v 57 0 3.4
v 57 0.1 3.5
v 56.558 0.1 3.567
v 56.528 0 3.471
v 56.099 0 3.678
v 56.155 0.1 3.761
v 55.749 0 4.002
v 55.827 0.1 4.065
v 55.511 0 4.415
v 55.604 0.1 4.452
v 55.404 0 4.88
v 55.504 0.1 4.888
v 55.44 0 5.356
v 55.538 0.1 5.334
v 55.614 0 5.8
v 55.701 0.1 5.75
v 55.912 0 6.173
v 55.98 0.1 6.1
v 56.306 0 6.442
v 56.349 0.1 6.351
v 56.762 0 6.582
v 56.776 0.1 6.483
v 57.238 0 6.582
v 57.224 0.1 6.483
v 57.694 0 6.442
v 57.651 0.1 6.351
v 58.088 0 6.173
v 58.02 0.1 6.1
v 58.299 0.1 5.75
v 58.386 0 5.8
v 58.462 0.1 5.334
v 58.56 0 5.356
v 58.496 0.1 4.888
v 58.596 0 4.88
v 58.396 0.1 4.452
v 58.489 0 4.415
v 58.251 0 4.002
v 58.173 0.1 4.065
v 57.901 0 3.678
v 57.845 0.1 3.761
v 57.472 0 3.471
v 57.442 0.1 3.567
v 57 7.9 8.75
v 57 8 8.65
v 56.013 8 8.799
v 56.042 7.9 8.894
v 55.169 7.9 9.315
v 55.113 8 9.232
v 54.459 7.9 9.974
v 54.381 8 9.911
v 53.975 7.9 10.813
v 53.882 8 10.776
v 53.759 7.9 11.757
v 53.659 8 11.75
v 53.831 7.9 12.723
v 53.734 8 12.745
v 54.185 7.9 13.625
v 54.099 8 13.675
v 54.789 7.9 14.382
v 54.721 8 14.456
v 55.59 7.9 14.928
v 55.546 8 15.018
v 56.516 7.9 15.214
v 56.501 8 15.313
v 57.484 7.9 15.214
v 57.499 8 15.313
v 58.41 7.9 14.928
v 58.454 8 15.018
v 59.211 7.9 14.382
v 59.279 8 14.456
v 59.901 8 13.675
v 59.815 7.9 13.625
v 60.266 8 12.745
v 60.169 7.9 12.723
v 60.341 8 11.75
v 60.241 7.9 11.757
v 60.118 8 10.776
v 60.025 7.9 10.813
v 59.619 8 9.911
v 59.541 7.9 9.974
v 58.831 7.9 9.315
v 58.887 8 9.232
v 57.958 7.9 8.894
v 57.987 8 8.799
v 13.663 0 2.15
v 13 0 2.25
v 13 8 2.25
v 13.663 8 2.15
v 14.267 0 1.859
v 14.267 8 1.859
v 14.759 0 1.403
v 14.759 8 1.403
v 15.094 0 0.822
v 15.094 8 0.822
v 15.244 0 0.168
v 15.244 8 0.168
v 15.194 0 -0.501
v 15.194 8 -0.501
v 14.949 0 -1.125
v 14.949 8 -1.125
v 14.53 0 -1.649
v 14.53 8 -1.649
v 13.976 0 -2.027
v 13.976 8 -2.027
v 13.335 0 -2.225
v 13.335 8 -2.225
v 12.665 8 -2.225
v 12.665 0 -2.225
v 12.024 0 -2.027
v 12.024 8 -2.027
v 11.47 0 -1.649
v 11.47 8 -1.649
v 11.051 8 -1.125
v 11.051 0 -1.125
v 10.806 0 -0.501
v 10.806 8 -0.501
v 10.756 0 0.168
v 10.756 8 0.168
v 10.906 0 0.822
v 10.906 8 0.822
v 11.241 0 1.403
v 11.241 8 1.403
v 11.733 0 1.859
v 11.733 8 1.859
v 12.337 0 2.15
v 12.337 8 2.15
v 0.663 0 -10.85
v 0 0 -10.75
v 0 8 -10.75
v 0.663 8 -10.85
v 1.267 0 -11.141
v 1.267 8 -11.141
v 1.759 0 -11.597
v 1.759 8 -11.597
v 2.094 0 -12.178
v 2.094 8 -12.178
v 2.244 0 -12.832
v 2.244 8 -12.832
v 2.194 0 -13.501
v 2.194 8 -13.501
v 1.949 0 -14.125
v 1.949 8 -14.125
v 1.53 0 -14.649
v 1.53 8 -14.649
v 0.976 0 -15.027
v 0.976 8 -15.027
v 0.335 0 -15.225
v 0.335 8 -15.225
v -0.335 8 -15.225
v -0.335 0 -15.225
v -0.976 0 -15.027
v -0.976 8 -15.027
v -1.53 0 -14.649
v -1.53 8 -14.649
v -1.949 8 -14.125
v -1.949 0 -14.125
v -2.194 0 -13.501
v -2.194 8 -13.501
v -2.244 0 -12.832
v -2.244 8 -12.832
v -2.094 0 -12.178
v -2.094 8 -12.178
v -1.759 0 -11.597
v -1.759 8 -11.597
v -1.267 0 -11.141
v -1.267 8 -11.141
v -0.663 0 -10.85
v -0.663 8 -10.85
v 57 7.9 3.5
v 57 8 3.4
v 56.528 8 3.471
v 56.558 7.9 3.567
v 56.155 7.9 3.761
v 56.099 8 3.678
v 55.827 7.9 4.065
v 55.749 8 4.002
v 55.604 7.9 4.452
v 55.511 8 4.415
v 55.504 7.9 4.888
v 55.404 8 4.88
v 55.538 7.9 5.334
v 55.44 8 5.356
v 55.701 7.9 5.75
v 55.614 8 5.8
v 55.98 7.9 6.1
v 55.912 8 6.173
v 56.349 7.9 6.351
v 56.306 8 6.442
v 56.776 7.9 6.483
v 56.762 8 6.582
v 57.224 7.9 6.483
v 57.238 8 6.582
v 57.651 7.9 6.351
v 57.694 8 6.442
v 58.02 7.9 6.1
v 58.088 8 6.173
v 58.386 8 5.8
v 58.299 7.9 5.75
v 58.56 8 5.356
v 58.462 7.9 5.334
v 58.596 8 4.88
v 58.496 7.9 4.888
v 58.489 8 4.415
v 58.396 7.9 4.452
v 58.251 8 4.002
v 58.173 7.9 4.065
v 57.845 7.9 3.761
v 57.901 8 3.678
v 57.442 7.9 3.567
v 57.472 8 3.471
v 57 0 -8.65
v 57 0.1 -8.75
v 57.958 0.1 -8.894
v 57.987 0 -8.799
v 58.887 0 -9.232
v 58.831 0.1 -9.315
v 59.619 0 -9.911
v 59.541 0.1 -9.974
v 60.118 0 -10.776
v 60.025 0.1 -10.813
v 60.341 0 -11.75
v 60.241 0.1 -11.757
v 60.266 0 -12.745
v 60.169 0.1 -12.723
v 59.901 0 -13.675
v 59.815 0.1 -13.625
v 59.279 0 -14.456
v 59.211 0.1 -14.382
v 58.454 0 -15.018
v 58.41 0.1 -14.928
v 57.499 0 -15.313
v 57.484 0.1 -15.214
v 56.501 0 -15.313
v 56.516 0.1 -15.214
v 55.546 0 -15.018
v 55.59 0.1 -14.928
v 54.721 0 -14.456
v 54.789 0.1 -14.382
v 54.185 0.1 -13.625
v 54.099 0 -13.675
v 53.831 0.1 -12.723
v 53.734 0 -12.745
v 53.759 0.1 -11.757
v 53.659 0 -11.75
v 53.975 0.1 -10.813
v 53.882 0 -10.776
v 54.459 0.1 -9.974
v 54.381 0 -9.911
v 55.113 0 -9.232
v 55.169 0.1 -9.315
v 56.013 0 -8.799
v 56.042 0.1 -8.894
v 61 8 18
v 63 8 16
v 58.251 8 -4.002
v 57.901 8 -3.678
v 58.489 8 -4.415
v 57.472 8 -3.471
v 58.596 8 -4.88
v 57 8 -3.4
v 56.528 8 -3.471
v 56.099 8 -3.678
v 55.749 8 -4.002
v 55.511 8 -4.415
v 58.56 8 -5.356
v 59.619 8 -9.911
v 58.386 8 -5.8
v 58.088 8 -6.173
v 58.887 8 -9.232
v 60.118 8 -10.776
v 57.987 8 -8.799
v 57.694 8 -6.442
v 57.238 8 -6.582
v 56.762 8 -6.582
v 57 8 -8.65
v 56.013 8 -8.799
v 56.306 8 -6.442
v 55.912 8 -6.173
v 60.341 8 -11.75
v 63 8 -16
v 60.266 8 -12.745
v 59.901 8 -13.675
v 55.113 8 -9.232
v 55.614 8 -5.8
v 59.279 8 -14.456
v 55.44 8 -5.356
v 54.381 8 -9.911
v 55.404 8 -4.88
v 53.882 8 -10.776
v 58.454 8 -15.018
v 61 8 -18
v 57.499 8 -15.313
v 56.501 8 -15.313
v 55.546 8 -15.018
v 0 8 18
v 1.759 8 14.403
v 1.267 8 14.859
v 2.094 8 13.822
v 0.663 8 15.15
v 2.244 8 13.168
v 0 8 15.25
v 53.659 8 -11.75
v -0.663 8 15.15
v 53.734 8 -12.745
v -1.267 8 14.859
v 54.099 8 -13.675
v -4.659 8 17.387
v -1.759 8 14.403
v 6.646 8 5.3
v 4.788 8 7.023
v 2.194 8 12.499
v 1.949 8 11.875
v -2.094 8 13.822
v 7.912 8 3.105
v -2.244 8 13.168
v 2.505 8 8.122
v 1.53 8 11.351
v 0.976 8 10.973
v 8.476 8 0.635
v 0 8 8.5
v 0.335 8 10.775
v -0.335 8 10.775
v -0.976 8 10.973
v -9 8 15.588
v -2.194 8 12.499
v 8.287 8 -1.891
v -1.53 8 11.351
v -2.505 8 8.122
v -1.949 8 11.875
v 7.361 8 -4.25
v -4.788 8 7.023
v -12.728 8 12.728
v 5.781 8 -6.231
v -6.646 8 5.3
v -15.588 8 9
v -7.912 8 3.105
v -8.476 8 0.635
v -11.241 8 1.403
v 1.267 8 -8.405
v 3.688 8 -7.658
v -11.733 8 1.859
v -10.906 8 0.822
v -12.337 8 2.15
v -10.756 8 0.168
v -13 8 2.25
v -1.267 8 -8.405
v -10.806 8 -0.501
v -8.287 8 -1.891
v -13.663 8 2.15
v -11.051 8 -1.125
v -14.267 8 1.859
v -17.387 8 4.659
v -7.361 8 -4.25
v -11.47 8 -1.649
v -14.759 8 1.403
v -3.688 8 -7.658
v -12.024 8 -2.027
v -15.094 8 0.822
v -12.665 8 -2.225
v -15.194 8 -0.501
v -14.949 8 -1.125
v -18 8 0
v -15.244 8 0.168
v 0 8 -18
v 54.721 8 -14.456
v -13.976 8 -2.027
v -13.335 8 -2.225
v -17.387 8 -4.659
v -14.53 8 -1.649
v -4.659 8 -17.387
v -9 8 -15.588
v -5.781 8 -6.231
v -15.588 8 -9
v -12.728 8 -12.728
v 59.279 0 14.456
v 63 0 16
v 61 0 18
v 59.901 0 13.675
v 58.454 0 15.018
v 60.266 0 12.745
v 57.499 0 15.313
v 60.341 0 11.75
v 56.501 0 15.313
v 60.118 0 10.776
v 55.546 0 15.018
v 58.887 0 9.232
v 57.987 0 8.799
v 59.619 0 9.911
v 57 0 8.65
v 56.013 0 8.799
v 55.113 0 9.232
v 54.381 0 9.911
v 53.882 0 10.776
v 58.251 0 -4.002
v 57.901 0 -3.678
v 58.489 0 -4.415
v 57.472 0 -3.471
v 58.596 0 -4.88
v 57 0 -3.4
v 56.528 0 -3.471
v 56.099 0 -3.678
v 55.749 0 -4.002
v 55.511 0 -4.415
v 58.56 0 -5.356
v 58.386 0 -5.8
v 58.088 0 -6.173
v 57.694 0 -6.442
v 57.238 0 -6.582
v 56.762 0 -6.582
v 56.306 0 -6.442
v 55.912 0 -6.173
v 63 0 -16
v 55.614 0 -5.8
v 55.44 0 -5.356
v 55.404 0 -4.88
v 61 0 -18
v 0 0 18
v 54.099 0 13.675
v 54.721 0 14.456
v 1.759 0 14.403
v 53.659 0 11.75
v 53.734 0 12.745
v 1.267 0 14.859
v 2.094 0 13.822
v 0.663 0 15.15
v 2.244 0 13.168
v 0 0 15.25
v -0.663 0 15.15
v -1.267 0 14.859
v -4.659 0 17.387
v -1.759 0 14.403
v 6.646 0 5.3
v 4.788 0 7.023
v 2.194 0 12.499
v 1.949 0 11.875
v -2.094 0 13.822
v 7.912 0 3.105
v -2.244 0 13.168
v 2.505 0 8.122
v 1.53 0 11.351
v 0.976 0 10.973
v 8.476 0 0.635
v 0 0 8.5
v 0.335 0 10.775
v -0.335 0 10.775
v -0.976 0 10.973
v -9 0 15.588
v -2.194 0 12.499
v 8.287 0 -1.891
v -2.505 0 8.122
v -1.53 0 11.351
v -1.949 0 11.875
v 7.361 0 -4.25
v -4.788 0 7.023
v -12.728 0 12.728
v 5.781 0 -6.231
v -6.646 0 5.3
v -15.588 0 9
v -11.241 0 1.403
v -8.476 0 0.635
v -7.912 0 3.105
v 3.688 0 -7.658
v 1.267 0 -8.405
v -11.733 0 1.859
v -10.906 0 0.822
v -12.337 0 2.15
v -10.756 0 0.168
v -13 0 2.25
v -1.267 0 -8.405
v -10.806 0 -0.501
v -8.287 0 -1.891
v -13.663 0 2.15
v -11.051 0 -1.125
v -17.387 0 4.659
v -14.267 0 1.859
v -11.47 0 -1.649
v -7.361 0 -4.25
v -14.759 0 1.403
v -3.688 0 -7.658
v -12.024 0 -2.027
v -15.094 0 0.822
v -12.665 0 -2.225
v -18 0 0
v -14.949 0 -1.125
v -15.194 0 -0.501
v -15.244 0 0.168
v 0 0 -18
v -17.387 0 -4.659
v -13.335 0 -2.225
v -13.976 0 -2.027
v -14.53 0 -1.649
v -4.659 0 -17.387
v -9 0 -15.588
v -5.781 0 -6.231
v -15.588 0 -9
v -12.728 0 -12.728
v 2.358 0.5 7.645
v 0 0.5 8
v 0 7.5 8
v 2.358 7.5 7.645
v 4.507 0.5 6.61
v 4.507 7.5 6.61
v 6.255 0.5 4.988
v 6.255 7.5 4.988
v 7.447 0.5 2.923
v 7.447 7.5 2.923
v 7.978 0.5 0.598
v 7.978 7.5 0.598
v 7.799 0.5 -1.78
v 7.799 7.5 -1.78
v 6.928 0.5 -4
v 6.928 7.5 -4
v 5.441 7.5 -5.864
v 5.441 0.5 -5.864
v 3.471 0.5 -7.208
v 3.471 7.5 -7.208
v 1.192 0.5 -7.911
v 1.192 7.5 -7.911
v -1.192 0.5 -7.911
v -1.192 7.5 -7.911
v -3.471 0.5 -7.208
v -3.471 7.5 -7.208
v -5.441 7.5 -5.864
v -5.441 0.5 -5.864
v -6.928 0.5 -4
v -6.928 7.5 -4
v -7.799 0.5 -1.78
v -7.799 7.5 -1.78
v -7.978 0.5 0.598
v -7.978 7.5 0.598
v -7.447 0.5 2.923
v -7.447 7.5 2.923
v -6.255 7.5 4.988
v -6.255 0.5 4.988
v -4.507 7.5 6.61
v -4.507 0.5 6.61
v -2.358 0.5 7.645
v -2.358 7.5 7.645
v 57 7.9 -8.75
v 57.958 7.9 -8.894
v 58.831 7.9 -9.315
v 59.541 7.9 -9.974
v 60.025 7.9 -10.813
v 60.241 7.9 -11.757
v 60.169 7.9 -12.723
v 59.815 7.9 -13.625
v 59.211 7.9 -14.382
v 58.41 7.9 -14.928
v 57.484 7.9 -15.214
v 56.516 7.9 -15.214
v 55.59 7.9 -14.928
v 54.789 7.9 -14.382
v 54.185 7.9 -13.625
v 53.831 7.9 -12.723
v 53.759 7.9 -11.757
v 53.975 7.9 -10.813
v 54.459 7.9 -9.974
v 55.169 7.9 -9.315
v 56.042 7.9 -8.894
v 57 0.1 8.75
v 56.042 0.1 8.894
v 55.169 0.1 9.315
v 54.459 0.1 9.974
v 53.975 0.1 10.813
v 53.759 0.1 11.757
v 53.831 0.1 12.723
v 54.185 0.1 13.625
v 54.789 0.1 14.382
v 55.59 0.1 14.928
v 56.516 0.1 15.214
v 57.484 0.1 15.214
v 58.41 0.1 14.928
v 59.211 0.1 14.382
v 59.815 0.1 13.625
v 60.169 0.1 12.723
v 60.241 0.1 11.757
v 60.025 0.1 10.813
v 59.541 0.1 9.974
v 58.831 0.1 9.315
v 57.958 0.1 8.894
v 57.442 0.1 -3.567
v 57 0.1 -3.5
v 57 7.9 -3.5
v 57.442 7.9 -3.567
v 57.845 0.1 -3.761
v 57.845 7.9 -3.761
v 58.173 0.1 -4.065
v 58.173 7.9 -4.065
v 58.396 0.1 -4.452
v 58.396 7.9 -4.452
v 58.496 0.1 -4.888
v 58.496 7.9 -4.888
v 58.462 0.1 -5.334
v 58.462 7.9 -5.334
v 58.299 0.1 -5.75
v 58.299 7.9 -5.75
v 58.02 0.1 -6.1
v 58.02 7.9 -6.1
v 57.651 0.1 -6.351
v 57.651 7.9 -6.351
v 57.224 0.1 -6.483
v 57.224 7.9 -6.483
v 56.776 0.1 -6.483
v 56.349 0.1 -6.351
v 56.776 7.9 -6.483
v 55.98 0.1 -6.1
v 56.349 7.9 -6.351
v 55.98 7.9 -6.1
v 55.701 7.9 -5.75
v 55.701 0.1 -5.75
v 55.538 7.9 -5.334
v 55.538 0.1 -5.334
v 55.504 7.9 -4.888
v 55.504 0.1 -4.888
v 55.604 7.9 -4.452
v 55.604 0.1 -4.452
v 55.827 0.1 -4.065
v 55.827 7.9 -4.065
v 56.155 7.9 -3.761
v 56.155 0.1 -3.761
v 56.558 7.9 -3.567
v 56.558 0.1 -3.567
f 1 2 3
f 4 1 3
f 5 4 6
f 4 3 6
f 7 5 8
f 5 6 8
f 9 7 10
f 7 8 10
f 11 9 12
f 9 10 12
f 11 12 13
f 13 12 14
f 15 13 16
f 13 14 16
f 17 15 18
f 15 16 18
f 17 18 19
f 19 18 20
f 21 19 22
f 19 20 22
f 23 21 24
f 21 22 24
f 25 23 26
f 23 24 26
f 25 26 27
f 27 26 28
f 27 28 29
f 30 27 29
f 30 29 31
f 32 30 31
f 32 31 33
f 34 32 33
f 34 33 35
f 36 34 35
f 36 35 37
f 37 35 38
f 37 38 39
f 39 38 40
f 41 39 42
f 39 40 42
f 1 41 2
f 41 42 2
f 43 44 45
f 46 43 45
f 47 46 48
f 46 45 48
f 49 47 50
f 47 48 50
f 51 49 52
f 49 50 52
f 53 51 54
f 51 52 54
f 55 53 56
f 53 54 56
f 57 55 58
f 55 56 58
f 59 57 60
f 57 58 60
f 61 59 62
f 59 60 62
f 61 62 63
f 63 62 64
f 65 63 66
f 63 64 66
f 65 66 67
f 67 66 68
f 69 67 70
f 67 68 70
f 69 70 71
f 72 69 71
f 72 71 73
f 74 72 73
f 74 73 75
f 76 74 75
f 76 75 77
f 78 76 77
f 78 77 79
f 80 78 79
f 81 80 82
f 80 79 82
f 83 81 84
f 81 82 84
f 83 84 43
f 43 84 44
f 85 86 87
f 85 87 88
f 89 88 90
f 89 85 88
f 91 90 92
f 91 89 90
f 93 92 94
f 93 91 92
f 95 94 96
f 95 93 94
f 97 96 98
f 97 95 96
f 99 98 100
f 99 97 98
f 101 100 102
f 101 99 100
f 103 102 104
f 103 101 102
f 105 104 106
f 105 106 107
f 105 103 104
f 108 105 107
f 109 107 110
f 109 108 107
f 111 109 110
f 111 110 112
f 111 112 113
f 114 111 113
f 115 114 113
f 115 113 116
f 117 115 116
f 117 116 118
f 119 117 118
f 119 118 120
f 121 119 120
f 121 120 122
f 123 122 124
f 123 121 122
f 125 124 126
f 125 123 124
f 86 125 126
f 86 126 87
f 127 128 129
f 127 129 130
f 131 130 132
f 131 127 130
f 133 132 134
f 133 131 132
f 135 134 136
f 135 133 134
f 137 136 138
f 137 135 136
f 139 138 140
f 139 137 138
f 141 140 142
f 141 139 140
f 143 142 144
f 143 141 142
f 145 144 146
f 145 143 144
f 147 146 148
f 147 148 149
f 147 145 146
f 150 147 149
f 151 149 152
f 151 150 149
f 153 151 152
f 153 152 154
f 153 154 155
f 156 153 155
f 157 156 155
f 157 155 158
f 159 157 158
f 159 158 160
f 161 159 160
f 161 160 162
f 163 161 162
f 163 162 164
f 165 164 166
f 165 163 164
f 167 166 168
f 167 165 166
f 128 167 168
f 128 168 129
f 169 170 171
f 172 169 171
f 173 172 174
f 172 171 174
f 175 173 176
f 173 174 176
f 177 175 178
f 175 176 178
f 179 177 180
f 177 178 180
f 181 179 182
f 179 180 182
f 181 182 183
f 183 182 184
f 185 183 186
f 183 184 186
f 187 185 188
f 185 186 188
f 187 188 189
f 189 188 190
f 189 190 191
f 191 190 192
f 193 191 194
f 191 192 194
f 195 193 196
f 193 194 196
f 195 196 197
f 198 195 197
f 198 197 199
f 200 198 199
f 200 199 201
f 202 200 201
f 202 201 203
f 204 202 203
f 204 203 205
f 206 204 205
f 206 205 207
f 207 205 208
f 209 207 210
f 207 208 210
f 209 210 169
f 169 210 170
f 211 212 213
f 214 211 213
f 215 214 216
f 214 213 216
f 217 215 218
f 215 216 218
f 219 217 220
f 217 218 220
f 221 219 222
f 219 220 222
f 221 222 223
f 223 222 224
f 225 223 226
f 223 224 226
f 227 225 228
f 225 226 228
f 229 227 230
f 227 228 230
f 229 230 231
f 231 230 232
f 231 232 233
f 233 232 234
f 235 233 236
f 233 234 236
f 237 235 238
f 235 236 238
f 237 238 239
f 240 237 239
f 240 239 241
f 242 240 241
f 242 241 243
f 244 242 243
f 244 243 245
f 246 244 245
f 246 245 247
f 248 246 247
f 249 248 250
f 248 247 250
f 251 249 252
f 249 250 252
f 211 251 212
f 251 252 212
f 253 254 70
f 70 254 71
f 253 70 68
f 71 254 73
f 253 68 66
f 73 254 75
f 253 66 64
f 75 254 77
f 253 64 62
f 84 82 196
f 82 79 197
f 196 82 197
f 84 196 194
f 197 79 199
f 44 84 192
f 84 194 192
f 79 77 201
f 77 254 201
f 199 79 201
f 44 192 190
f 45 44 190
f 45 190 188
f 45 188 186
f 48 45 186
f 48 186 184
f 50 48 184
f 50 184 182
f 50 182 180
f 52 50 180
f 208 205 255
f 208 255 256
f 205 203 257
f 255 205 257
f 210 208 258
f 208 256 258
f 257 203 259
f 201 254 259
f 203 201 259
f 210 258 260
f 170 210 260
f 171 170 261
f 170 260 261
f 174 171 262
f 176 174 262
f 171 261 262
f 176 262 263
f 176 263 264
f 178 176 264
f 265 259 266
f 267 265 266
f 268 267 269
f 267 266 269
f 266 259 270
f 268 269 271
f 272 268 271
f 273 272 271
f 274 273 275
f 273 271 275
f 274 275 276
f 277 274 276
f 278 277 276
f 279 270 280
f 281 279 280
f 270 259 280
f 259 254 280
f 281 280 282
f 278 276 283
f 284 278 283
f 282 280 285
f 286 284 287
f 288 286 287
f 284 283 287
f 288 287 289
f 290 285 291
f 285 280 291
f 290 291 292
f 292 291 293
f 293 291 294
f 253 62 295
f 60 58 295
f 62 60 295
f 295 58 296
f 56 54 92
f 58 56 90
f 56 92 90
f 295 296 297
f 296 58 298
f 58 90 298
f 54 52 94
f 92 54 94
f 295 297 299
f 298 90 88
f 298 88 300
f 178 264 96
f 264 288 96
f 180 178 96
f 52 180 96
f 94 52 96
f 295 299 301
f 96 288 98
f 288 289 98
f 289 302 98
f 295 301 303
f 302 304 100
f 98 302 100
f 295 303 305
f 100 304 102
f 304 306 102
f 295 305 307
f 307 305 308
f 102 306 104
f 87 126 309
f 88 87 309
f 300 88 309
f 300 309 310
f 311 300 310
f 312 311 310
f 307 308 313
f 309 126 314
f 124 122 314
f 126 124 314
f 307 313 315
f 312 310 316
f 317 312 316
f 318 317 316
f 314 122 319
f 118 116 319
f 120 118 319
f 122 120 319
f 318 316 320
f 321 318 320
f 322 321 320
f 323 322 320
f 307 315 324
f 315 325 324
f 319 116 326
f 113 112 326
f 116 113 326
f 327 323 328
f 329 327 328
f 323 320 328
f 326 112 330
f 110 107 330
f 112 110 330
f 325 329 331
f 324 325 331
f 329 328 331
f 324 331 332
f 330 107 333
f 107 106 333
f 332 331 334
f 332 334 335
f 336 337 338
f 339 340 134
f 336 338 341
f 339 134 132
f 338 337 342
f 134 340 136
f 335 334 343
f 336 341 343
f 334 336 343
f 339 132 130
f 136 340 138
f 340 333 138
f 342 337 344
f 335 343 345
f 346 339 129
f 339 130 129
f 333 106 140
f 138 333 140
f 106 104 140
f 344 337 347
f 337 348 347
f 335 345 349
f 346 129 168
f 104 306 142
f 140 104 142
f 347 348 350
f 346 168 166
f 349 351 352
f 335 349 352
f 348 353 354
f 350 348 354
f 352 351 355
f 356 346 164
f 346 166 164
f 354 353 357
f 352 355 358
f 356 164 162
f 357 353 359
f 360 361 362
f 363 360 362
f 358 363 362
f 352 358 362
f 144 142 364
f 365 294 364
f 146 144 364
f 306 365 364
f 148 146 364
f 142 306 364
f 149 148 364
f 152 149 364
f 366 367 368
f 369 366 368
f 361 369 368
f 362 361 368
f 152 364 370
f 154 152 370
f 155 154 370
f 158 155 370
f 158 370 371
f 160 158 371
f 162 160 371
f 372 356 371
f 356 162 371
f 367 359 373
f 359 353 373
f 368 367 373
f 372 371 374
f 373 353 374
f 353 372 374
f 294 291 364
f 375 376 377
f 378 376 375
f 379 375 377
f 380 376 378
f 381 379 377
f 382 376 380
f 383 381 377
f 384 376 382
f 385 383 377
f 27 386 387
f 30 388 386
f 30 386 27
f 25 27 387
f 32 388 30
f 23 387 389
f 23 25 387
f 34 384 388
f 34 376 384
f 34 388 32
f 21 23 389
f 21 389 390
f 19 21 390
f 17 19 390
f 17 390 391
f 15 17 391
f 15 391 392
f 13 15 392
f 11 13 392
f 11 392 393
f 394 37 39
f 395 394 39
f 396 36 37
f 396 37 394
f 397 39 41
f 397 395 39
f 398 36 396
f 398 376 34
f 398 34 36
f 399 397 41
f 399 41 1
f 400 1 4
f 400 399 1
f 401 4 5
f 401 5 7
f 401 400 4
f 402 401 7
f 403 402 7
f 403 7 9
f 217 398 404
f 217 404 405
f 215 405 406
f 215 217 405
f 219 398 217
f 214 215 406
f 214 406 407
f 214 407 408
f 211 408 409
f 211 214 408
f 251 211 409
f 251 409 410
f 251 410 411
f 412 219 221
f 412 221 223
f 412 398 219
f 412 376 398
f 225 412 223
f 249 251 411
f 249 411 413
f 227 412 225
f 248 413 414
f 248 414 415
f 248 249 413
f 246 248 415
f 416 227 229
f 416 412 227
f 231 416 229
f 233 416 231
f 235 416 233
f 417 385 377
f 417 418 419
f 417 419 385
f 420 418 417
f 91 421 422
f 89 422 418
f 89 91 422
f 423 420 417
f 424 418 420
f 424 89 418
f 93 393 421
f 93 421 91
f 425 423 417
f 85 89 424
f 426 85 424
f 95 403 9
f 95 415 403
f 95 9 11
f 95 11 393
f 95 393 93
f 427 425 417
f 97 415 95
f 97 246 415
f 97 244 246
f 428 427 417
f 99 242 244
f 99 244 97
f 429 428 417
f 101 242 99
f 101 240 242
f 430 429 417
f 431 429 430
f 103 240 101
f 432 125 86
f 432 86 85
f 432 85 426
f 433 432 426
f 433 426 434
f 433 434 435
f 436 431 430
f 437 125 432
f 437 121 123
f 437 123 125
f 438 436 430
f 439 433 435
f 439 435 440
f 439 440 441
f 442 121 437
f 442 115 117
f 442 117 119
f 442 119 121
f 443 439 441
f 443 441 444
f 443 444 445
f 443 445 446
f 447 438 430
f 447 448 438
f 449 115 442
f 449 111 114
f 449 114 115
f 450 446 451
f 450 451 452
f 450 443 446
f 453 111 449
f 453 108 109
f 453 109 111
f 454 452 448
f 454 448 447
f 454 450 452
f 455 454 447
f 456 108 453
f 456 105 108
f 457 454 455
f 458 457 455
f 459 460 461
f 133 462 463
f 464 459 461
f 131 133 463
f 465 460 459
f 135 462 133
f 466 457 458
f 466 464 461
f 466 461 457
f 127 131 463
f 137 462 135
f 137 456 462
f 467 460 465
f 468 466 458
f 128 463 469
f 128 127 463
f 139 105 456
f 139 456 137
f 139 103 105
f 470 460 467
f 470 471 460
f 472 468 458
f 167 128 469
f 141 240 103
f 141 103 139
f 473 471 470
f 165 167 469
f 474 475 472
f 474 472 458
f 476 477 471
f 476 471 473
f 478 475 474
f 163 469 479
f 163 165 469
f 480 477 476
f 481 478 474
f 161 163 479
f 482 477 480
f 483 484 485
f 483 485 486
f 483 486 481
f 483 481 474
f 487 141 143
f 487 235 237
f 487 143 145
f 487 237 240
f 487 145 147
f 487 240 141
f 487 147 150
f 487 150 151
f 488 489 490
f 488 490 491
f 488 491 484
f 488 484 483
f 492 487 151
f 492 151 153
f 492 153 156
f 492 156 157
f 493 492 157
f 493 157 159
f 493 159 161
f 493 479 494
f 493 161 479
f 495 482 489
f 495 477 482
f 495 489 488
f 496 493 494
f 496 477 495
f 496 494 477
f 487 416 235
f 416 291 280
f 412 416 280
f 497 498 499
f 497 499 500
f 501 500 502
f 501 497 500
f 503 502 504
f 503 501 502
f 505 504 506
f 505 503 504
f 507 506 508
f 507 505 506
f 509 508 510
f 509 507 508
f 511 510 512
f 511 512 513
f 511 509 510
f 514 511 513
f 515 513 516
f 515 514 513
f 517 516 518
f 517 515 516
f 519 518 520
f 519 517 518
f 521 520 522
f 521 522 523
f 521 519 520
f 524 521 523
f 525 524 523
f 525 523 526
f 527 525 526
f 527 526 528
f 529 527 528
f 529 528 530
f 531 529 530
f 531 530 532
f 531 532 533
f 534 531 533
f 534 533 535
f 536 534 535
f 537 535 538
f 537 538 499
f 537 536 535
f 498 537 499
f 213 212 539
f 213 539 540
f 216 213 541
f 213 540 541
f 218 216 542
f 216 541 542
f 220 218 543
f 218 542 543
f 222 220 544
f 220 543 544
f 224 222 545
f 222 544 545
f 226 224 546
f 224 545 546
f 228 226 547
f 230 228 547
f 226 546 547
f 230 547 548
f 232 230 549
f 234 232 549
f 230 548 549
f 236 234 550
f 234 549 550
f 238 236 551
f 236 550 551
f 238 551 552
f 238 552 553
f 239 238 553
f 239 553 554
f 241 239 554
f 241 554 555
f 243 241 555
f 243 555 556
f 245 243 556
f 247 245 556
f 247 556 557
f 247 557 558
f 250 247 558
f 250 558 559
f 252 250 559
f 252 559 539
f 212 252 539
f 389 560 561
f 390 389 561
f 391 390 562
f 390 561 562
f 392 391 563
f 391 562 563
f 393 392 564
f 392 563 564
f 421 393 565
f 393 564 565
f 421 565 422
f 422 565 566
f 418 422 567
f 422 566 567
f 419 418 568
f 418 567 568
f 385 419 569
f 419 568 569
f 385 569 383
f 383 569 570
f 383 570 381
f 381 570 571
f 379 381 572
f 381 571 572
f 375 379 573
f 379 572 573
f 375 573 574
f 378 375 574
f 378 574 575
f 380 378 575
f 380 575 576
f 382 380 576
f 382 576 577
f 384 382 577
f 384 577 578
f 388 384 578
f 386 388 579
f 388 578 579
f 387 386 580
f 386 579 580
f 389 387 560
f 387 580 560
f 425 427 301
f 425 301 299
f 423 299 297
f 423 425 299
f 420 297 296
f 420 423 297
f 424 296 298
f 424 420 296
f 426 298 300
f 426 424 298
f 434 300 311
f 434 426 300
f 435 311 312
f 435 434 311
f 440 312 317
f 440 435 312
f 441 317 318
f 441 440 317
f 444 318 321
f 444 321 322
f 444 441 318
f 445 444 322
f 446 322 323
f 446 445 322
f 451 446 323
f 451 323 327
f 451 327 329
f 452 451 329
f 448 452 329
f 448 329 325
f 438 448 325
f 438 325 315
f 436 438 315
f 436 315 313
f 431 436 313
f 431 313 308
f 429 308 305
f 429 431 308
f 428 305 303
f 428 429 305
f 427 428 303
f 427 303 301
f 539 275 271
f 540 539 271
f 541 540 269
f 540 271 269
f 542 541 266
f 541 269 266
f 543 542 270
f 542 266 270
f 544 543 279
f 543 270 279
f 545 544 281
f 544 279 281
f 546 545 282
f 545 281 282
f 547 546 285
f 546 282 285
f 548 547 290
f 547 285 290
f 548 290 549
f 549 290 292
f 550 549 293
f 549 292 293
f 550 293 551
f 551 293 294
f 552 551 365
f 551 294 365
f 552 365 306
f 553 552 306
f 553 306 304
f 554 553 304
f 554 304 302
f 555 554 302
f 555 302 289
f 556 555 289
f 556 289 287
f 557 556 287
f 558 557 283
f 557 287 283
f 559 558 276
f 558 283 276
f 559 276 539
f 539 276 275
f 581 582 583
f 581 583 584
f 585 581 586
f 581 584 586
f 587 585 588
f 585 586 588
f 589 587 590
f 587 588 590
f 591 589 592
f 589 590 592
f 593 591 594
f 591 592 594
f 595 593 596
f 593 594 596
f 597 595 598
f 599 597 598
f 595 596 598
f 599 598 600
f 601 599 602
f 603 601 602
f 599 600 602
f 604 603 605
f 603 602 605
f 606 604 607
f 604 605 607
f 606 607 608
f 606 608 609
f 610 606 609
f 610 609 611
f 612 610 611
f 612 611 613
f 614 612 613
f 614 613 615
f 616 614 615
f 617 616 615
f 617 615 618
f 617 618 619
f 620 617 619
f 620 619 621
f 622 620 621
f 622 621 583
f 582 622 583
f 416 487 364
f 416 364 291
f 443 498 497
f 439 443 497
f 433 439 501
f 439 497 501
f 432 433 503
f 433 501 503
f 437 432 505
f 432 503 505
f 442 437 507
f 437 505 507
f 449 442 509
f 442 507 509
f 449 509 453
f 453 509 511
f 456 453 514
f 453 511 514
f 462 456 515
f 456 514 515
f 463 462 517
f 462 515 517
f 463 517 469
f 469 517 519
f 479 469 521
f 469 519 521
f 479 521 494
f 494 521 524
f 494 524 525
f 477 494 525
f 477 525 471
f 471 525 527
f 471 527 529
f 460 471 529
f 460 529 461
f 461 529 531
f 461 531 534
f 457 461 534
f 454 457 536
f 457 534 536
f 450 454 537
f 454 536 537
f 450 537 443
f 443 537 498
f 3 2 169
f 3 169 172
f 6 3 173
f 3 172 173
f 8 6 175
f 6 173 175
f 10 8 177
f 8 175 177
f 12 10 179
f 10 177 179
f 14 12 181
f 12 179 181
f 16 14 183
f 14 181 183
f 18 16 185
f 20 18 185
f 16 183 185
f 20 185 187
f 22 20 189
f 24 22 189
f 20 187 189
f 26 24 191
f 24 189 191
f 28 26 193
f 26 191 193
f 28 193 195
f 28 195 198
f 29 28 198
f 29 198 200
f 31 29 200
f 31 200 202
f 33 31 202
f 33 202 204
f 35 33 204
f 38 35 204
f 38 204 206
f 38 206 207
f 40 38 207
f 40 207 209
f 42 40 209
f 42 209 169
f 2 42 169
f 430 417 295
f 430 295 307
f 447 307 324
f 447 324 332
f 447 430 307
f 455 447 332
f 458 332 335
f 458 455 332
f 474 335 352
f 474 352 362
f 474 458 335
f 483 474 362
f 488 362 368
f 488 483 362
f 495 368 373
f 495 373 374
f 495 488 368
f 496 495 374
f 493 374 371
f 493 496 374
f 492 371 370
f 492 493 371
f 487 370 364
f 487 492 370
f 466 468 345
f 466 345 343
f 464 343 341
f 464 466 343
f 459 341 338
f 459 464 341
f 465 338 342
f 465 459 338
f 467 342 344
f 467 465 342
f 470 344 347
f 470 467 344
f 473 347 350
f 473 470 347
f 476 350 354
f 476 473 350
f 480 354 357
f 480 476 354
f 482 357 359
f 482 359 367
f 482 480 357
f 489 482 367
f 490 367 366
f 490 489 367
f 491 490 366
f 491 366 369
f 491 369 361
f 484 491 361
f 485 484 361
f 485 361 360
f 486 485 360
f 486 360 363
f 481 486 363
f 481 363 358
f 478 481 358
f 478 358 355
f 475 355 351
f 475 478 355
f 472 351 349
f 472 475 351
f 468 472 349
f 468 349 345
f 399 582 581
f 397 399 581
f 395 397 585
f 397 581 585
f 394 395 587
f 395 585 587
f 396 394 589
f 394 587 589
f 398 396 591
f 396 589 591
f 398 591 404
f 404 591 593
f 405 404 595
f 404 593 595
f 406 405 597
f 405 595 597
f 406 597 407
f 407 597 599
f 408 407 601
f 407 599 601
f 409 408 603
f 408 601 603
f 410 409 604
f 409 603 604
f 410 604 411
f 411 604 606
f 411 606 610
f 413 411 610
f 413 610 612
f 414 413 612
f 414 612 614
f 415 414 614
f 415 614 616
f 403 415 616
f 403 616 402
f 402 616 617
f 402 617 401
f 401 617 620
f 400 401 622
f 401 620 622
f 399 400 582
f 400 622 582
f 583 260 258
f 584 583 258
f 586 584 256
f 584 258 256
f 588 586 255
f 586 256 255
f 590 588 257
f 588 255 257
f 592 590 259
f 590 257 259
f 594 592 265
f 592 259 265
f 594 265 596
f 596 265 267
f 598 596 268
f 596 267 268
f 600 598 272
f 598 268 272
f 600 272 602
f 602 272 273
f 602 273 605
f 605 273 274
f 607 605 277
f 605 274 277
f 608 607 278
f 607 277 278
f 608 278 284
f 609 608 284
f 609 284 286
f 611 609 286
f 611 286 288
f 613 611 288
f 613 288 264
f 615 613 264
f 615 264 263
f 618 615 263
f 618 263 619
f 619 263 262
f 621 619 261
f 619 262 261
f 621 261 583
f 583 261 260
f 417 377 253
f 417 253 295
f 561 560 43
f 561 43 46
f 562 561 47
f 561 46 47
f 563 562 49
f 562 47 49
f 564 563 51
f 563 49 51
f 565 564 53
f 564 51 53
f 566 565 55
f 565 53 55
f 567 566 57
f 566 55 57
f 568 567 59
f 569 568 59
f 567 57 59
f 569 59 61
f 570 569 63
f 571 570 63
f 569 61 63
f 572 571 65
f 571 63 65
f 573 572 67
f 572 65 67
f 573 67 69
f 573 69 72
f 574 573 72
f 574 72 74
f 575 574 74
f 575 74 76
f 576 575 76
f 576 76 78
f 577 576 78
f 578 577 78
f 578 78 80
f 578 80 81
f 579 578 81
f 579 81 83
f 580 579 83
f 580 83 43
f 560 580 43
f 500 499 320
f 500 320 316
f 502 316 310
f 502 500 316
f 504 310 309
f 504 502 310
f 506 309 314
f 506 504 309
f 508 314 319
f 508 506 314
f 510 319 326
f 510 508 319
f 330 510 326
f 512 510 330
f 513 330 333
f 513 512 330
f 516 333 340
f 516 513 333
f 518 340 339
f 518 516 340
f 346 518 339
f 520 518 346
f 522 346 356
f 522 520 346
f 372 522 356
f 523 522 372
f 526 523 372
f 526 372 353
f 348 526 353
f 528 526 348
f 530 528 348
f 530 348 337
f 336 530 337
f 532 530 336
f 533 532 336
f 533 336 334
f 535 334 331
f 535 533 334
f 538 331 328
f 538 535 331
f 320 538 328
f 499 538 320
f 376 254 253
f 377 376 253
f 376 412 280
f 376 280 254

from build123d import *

# Parameters (mm, degrees)
SKETCH1_R           = 8
SKETCH1_R_2         = 2.25
BOSS_EXTRUDE1_DEPTH = 8
SKETCH2_R           = 3.25
SKETCH2_R_2         = 1.5
CUT_EXTRUDE1_DEPTH  = 67.007575323
CHAMFER1_SIZE       = 0.5
CHAMFER2_SIZE       = 0.1


with BuildPart() as part:
    # Sketch1 → Boss-Extrude1 (new body)
    with BuildSketch(Plane(origin=(0, 0, 0), x_dir=(1, 0, 0), z_dir=(0, 1, 0))):
        with BuildLine():
            Line((0, 18), (61, 18))
            Line((61, 18), (63, 16))
            Line((63, 16), (63, -16))
            Line((63, -16), (61, -18))
            Line((61, -18), (0, -18))
            ThreePointArc((0, -18), (-18, 0), (0, 18))
        make_face()
        with Locations(Location((0, 0, 0), (0, 0, 270))):
            Circle(SKETCH1_R, mode=Mode.SUBTRACT)
        with Locations(Location((0, 13, 0), (0, 0, 270))):
            Circle(SKETCH1_R_2, mode=Mode.SUBTRACT)
        with Locations(Location((13, 0, 0), (0, 0, 270))):
            Circle(SKETCH1_R_2, mode=Mode.SUBTRACT)
        with Locations(Location((0, -13, 0), (0, 0, 270))):
            Circle(SKETCH1_R_2, mode=Mode.SUBTRACT)
        with Locations(Location((-13, 0, 0), (0, 0, 270))):
            Circle(SKETCH1_R_2, mode=Mode.SUBTRACT)
    extrude(amount=BOSS_EXTRUDE1_DEPTH)

    # Sketch2 → Cut-Extrude1 (cut, through all)
    with BuildSketch(Plane(origin=(0, 8, 0), x_dir=(1, 0, 0), z_dir=(0, 1, 0))):
        with Locations(Location((57, 12, 0), (0, 0, 270))):
            Circle(SKETCH2_R)
        with Locations(Location((57, 5, 0), (0, 0, 270))):
            Circle(SKETCH2_R_2)
        with Locations(Location((57, -5, 0), (0, 0, 90))):
            Circle(SKETCH2_R_2)
        with Locations(Location((57, -12, 0), (0, 0, 90))):
            Circle(SKETCH2_R)
    extrude(amount=-CUT_EXTRUDE1_DEPTH, mode=Mode.SUBTRACT)

    # Chamfer1
    chamfer1_edges = [part.edges().sort_by_distance(p)[0] for p in [
        (0, 0, -8),
        (0, 8, -8),
    ]]
    chamfer(chamfer1_edges, length=CHAMFER1_SIZE)

    # Chamfer2
    chamfer2_edges = [part.edges().sort_by_distance(p)[0] for p in [
        (57, 0, -15.25),
        (57, 8, -15.25),
        (57, 0, -6.5),
        (57, 8, -6.5),
        (57, 0, 6.5),
        (57, 8, 6.5),
        (57, 0, 15.25),
        (57, 8, 15.25),
    ]]
    chamfer(chamfer2_edges, length=CHAMFER2_SIZE)


solid = part.part
